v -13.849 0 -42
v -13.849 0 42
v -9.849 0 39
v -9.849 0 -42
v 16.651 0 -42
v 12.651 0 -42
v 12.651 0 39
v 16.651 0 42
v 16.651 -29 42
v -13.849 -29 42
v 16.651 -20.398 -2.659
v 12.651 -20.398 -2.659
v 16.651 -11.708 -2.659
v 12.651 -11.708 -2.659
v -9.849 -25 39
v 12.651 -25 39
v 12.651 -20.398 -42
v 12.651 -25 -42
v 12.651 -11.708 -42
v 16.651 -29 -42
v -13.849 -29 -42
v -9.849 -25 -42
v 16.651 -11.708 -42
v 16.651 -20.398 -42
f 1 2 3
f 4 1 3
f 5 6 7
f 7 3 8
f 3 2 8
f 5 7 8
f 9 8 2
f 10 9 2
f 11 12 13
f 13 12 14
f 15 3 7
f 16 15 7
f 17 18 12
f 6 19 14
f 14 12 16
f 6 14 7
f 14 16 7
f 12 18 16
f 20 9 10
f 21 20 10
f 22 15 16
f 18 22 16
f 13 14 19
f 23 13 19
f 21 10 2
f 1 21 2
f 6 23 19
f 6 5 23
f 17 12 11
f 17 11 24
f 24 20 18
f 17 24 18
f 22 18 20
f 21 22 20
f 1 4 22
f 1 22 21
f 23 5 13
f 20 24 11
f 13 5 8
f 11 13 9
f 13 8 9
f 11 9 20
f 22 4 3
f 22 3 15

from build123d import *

# Parameters (mm, degrees)
BOSS_EXTRUDE1_DEPTH = 42
SKETCH2_W           = 30.5
SKETCH2_H           = 29
BOSS_EXTRUDE2_DEPTH = 3
SKETCH3_W           = 40
SKETCH3_H           = 8.69
CUT_EXTRUDE1_DEPTH  = 30


with BuildPart() as part:
    # Sketch1 → Boss-Extrude1 (new body, symmetric)
    with BuildSketch(Plane.XY):
        Polygon((-9.848648649, 0), (-9.848648649, -25), (12.651351351, -25), (12.651351351, 0), (16.651351351, 0), (16.651351351, -29), (-13.848648649, -29), (-13.848648649, 0), align=None)
    extrude(amount=BOSS_EXTRUDE1_DEPTH, both=True)

    # Sketch2 → Boss-Extrude2 (add)
    with BuildSketch(Plane.XY.offset(42)):
        with Locations((1.401351351, -14.5)):
            Rectangle(SKETCH2_W, SKETCH2_H)
    extrude(amount=-BOSS_EXTRUDE2_DEPTH)

    # Sketch3 → Cut-Extrude1 (cut)
    with BuildSketch(Plane(origin=(0, 0, 0), x_dir=(0, 0, -1), z_dir=(1, 0, 0))):
        with Locations((22.65905185, -16.052995557)):
            Rectangle(SKETCH3_W, SKETCH3_H)
    extrude(amount=CUT_EXTRUDE1_DEPTH, mode=Mode.SUBTRACT)


solid = part.part
